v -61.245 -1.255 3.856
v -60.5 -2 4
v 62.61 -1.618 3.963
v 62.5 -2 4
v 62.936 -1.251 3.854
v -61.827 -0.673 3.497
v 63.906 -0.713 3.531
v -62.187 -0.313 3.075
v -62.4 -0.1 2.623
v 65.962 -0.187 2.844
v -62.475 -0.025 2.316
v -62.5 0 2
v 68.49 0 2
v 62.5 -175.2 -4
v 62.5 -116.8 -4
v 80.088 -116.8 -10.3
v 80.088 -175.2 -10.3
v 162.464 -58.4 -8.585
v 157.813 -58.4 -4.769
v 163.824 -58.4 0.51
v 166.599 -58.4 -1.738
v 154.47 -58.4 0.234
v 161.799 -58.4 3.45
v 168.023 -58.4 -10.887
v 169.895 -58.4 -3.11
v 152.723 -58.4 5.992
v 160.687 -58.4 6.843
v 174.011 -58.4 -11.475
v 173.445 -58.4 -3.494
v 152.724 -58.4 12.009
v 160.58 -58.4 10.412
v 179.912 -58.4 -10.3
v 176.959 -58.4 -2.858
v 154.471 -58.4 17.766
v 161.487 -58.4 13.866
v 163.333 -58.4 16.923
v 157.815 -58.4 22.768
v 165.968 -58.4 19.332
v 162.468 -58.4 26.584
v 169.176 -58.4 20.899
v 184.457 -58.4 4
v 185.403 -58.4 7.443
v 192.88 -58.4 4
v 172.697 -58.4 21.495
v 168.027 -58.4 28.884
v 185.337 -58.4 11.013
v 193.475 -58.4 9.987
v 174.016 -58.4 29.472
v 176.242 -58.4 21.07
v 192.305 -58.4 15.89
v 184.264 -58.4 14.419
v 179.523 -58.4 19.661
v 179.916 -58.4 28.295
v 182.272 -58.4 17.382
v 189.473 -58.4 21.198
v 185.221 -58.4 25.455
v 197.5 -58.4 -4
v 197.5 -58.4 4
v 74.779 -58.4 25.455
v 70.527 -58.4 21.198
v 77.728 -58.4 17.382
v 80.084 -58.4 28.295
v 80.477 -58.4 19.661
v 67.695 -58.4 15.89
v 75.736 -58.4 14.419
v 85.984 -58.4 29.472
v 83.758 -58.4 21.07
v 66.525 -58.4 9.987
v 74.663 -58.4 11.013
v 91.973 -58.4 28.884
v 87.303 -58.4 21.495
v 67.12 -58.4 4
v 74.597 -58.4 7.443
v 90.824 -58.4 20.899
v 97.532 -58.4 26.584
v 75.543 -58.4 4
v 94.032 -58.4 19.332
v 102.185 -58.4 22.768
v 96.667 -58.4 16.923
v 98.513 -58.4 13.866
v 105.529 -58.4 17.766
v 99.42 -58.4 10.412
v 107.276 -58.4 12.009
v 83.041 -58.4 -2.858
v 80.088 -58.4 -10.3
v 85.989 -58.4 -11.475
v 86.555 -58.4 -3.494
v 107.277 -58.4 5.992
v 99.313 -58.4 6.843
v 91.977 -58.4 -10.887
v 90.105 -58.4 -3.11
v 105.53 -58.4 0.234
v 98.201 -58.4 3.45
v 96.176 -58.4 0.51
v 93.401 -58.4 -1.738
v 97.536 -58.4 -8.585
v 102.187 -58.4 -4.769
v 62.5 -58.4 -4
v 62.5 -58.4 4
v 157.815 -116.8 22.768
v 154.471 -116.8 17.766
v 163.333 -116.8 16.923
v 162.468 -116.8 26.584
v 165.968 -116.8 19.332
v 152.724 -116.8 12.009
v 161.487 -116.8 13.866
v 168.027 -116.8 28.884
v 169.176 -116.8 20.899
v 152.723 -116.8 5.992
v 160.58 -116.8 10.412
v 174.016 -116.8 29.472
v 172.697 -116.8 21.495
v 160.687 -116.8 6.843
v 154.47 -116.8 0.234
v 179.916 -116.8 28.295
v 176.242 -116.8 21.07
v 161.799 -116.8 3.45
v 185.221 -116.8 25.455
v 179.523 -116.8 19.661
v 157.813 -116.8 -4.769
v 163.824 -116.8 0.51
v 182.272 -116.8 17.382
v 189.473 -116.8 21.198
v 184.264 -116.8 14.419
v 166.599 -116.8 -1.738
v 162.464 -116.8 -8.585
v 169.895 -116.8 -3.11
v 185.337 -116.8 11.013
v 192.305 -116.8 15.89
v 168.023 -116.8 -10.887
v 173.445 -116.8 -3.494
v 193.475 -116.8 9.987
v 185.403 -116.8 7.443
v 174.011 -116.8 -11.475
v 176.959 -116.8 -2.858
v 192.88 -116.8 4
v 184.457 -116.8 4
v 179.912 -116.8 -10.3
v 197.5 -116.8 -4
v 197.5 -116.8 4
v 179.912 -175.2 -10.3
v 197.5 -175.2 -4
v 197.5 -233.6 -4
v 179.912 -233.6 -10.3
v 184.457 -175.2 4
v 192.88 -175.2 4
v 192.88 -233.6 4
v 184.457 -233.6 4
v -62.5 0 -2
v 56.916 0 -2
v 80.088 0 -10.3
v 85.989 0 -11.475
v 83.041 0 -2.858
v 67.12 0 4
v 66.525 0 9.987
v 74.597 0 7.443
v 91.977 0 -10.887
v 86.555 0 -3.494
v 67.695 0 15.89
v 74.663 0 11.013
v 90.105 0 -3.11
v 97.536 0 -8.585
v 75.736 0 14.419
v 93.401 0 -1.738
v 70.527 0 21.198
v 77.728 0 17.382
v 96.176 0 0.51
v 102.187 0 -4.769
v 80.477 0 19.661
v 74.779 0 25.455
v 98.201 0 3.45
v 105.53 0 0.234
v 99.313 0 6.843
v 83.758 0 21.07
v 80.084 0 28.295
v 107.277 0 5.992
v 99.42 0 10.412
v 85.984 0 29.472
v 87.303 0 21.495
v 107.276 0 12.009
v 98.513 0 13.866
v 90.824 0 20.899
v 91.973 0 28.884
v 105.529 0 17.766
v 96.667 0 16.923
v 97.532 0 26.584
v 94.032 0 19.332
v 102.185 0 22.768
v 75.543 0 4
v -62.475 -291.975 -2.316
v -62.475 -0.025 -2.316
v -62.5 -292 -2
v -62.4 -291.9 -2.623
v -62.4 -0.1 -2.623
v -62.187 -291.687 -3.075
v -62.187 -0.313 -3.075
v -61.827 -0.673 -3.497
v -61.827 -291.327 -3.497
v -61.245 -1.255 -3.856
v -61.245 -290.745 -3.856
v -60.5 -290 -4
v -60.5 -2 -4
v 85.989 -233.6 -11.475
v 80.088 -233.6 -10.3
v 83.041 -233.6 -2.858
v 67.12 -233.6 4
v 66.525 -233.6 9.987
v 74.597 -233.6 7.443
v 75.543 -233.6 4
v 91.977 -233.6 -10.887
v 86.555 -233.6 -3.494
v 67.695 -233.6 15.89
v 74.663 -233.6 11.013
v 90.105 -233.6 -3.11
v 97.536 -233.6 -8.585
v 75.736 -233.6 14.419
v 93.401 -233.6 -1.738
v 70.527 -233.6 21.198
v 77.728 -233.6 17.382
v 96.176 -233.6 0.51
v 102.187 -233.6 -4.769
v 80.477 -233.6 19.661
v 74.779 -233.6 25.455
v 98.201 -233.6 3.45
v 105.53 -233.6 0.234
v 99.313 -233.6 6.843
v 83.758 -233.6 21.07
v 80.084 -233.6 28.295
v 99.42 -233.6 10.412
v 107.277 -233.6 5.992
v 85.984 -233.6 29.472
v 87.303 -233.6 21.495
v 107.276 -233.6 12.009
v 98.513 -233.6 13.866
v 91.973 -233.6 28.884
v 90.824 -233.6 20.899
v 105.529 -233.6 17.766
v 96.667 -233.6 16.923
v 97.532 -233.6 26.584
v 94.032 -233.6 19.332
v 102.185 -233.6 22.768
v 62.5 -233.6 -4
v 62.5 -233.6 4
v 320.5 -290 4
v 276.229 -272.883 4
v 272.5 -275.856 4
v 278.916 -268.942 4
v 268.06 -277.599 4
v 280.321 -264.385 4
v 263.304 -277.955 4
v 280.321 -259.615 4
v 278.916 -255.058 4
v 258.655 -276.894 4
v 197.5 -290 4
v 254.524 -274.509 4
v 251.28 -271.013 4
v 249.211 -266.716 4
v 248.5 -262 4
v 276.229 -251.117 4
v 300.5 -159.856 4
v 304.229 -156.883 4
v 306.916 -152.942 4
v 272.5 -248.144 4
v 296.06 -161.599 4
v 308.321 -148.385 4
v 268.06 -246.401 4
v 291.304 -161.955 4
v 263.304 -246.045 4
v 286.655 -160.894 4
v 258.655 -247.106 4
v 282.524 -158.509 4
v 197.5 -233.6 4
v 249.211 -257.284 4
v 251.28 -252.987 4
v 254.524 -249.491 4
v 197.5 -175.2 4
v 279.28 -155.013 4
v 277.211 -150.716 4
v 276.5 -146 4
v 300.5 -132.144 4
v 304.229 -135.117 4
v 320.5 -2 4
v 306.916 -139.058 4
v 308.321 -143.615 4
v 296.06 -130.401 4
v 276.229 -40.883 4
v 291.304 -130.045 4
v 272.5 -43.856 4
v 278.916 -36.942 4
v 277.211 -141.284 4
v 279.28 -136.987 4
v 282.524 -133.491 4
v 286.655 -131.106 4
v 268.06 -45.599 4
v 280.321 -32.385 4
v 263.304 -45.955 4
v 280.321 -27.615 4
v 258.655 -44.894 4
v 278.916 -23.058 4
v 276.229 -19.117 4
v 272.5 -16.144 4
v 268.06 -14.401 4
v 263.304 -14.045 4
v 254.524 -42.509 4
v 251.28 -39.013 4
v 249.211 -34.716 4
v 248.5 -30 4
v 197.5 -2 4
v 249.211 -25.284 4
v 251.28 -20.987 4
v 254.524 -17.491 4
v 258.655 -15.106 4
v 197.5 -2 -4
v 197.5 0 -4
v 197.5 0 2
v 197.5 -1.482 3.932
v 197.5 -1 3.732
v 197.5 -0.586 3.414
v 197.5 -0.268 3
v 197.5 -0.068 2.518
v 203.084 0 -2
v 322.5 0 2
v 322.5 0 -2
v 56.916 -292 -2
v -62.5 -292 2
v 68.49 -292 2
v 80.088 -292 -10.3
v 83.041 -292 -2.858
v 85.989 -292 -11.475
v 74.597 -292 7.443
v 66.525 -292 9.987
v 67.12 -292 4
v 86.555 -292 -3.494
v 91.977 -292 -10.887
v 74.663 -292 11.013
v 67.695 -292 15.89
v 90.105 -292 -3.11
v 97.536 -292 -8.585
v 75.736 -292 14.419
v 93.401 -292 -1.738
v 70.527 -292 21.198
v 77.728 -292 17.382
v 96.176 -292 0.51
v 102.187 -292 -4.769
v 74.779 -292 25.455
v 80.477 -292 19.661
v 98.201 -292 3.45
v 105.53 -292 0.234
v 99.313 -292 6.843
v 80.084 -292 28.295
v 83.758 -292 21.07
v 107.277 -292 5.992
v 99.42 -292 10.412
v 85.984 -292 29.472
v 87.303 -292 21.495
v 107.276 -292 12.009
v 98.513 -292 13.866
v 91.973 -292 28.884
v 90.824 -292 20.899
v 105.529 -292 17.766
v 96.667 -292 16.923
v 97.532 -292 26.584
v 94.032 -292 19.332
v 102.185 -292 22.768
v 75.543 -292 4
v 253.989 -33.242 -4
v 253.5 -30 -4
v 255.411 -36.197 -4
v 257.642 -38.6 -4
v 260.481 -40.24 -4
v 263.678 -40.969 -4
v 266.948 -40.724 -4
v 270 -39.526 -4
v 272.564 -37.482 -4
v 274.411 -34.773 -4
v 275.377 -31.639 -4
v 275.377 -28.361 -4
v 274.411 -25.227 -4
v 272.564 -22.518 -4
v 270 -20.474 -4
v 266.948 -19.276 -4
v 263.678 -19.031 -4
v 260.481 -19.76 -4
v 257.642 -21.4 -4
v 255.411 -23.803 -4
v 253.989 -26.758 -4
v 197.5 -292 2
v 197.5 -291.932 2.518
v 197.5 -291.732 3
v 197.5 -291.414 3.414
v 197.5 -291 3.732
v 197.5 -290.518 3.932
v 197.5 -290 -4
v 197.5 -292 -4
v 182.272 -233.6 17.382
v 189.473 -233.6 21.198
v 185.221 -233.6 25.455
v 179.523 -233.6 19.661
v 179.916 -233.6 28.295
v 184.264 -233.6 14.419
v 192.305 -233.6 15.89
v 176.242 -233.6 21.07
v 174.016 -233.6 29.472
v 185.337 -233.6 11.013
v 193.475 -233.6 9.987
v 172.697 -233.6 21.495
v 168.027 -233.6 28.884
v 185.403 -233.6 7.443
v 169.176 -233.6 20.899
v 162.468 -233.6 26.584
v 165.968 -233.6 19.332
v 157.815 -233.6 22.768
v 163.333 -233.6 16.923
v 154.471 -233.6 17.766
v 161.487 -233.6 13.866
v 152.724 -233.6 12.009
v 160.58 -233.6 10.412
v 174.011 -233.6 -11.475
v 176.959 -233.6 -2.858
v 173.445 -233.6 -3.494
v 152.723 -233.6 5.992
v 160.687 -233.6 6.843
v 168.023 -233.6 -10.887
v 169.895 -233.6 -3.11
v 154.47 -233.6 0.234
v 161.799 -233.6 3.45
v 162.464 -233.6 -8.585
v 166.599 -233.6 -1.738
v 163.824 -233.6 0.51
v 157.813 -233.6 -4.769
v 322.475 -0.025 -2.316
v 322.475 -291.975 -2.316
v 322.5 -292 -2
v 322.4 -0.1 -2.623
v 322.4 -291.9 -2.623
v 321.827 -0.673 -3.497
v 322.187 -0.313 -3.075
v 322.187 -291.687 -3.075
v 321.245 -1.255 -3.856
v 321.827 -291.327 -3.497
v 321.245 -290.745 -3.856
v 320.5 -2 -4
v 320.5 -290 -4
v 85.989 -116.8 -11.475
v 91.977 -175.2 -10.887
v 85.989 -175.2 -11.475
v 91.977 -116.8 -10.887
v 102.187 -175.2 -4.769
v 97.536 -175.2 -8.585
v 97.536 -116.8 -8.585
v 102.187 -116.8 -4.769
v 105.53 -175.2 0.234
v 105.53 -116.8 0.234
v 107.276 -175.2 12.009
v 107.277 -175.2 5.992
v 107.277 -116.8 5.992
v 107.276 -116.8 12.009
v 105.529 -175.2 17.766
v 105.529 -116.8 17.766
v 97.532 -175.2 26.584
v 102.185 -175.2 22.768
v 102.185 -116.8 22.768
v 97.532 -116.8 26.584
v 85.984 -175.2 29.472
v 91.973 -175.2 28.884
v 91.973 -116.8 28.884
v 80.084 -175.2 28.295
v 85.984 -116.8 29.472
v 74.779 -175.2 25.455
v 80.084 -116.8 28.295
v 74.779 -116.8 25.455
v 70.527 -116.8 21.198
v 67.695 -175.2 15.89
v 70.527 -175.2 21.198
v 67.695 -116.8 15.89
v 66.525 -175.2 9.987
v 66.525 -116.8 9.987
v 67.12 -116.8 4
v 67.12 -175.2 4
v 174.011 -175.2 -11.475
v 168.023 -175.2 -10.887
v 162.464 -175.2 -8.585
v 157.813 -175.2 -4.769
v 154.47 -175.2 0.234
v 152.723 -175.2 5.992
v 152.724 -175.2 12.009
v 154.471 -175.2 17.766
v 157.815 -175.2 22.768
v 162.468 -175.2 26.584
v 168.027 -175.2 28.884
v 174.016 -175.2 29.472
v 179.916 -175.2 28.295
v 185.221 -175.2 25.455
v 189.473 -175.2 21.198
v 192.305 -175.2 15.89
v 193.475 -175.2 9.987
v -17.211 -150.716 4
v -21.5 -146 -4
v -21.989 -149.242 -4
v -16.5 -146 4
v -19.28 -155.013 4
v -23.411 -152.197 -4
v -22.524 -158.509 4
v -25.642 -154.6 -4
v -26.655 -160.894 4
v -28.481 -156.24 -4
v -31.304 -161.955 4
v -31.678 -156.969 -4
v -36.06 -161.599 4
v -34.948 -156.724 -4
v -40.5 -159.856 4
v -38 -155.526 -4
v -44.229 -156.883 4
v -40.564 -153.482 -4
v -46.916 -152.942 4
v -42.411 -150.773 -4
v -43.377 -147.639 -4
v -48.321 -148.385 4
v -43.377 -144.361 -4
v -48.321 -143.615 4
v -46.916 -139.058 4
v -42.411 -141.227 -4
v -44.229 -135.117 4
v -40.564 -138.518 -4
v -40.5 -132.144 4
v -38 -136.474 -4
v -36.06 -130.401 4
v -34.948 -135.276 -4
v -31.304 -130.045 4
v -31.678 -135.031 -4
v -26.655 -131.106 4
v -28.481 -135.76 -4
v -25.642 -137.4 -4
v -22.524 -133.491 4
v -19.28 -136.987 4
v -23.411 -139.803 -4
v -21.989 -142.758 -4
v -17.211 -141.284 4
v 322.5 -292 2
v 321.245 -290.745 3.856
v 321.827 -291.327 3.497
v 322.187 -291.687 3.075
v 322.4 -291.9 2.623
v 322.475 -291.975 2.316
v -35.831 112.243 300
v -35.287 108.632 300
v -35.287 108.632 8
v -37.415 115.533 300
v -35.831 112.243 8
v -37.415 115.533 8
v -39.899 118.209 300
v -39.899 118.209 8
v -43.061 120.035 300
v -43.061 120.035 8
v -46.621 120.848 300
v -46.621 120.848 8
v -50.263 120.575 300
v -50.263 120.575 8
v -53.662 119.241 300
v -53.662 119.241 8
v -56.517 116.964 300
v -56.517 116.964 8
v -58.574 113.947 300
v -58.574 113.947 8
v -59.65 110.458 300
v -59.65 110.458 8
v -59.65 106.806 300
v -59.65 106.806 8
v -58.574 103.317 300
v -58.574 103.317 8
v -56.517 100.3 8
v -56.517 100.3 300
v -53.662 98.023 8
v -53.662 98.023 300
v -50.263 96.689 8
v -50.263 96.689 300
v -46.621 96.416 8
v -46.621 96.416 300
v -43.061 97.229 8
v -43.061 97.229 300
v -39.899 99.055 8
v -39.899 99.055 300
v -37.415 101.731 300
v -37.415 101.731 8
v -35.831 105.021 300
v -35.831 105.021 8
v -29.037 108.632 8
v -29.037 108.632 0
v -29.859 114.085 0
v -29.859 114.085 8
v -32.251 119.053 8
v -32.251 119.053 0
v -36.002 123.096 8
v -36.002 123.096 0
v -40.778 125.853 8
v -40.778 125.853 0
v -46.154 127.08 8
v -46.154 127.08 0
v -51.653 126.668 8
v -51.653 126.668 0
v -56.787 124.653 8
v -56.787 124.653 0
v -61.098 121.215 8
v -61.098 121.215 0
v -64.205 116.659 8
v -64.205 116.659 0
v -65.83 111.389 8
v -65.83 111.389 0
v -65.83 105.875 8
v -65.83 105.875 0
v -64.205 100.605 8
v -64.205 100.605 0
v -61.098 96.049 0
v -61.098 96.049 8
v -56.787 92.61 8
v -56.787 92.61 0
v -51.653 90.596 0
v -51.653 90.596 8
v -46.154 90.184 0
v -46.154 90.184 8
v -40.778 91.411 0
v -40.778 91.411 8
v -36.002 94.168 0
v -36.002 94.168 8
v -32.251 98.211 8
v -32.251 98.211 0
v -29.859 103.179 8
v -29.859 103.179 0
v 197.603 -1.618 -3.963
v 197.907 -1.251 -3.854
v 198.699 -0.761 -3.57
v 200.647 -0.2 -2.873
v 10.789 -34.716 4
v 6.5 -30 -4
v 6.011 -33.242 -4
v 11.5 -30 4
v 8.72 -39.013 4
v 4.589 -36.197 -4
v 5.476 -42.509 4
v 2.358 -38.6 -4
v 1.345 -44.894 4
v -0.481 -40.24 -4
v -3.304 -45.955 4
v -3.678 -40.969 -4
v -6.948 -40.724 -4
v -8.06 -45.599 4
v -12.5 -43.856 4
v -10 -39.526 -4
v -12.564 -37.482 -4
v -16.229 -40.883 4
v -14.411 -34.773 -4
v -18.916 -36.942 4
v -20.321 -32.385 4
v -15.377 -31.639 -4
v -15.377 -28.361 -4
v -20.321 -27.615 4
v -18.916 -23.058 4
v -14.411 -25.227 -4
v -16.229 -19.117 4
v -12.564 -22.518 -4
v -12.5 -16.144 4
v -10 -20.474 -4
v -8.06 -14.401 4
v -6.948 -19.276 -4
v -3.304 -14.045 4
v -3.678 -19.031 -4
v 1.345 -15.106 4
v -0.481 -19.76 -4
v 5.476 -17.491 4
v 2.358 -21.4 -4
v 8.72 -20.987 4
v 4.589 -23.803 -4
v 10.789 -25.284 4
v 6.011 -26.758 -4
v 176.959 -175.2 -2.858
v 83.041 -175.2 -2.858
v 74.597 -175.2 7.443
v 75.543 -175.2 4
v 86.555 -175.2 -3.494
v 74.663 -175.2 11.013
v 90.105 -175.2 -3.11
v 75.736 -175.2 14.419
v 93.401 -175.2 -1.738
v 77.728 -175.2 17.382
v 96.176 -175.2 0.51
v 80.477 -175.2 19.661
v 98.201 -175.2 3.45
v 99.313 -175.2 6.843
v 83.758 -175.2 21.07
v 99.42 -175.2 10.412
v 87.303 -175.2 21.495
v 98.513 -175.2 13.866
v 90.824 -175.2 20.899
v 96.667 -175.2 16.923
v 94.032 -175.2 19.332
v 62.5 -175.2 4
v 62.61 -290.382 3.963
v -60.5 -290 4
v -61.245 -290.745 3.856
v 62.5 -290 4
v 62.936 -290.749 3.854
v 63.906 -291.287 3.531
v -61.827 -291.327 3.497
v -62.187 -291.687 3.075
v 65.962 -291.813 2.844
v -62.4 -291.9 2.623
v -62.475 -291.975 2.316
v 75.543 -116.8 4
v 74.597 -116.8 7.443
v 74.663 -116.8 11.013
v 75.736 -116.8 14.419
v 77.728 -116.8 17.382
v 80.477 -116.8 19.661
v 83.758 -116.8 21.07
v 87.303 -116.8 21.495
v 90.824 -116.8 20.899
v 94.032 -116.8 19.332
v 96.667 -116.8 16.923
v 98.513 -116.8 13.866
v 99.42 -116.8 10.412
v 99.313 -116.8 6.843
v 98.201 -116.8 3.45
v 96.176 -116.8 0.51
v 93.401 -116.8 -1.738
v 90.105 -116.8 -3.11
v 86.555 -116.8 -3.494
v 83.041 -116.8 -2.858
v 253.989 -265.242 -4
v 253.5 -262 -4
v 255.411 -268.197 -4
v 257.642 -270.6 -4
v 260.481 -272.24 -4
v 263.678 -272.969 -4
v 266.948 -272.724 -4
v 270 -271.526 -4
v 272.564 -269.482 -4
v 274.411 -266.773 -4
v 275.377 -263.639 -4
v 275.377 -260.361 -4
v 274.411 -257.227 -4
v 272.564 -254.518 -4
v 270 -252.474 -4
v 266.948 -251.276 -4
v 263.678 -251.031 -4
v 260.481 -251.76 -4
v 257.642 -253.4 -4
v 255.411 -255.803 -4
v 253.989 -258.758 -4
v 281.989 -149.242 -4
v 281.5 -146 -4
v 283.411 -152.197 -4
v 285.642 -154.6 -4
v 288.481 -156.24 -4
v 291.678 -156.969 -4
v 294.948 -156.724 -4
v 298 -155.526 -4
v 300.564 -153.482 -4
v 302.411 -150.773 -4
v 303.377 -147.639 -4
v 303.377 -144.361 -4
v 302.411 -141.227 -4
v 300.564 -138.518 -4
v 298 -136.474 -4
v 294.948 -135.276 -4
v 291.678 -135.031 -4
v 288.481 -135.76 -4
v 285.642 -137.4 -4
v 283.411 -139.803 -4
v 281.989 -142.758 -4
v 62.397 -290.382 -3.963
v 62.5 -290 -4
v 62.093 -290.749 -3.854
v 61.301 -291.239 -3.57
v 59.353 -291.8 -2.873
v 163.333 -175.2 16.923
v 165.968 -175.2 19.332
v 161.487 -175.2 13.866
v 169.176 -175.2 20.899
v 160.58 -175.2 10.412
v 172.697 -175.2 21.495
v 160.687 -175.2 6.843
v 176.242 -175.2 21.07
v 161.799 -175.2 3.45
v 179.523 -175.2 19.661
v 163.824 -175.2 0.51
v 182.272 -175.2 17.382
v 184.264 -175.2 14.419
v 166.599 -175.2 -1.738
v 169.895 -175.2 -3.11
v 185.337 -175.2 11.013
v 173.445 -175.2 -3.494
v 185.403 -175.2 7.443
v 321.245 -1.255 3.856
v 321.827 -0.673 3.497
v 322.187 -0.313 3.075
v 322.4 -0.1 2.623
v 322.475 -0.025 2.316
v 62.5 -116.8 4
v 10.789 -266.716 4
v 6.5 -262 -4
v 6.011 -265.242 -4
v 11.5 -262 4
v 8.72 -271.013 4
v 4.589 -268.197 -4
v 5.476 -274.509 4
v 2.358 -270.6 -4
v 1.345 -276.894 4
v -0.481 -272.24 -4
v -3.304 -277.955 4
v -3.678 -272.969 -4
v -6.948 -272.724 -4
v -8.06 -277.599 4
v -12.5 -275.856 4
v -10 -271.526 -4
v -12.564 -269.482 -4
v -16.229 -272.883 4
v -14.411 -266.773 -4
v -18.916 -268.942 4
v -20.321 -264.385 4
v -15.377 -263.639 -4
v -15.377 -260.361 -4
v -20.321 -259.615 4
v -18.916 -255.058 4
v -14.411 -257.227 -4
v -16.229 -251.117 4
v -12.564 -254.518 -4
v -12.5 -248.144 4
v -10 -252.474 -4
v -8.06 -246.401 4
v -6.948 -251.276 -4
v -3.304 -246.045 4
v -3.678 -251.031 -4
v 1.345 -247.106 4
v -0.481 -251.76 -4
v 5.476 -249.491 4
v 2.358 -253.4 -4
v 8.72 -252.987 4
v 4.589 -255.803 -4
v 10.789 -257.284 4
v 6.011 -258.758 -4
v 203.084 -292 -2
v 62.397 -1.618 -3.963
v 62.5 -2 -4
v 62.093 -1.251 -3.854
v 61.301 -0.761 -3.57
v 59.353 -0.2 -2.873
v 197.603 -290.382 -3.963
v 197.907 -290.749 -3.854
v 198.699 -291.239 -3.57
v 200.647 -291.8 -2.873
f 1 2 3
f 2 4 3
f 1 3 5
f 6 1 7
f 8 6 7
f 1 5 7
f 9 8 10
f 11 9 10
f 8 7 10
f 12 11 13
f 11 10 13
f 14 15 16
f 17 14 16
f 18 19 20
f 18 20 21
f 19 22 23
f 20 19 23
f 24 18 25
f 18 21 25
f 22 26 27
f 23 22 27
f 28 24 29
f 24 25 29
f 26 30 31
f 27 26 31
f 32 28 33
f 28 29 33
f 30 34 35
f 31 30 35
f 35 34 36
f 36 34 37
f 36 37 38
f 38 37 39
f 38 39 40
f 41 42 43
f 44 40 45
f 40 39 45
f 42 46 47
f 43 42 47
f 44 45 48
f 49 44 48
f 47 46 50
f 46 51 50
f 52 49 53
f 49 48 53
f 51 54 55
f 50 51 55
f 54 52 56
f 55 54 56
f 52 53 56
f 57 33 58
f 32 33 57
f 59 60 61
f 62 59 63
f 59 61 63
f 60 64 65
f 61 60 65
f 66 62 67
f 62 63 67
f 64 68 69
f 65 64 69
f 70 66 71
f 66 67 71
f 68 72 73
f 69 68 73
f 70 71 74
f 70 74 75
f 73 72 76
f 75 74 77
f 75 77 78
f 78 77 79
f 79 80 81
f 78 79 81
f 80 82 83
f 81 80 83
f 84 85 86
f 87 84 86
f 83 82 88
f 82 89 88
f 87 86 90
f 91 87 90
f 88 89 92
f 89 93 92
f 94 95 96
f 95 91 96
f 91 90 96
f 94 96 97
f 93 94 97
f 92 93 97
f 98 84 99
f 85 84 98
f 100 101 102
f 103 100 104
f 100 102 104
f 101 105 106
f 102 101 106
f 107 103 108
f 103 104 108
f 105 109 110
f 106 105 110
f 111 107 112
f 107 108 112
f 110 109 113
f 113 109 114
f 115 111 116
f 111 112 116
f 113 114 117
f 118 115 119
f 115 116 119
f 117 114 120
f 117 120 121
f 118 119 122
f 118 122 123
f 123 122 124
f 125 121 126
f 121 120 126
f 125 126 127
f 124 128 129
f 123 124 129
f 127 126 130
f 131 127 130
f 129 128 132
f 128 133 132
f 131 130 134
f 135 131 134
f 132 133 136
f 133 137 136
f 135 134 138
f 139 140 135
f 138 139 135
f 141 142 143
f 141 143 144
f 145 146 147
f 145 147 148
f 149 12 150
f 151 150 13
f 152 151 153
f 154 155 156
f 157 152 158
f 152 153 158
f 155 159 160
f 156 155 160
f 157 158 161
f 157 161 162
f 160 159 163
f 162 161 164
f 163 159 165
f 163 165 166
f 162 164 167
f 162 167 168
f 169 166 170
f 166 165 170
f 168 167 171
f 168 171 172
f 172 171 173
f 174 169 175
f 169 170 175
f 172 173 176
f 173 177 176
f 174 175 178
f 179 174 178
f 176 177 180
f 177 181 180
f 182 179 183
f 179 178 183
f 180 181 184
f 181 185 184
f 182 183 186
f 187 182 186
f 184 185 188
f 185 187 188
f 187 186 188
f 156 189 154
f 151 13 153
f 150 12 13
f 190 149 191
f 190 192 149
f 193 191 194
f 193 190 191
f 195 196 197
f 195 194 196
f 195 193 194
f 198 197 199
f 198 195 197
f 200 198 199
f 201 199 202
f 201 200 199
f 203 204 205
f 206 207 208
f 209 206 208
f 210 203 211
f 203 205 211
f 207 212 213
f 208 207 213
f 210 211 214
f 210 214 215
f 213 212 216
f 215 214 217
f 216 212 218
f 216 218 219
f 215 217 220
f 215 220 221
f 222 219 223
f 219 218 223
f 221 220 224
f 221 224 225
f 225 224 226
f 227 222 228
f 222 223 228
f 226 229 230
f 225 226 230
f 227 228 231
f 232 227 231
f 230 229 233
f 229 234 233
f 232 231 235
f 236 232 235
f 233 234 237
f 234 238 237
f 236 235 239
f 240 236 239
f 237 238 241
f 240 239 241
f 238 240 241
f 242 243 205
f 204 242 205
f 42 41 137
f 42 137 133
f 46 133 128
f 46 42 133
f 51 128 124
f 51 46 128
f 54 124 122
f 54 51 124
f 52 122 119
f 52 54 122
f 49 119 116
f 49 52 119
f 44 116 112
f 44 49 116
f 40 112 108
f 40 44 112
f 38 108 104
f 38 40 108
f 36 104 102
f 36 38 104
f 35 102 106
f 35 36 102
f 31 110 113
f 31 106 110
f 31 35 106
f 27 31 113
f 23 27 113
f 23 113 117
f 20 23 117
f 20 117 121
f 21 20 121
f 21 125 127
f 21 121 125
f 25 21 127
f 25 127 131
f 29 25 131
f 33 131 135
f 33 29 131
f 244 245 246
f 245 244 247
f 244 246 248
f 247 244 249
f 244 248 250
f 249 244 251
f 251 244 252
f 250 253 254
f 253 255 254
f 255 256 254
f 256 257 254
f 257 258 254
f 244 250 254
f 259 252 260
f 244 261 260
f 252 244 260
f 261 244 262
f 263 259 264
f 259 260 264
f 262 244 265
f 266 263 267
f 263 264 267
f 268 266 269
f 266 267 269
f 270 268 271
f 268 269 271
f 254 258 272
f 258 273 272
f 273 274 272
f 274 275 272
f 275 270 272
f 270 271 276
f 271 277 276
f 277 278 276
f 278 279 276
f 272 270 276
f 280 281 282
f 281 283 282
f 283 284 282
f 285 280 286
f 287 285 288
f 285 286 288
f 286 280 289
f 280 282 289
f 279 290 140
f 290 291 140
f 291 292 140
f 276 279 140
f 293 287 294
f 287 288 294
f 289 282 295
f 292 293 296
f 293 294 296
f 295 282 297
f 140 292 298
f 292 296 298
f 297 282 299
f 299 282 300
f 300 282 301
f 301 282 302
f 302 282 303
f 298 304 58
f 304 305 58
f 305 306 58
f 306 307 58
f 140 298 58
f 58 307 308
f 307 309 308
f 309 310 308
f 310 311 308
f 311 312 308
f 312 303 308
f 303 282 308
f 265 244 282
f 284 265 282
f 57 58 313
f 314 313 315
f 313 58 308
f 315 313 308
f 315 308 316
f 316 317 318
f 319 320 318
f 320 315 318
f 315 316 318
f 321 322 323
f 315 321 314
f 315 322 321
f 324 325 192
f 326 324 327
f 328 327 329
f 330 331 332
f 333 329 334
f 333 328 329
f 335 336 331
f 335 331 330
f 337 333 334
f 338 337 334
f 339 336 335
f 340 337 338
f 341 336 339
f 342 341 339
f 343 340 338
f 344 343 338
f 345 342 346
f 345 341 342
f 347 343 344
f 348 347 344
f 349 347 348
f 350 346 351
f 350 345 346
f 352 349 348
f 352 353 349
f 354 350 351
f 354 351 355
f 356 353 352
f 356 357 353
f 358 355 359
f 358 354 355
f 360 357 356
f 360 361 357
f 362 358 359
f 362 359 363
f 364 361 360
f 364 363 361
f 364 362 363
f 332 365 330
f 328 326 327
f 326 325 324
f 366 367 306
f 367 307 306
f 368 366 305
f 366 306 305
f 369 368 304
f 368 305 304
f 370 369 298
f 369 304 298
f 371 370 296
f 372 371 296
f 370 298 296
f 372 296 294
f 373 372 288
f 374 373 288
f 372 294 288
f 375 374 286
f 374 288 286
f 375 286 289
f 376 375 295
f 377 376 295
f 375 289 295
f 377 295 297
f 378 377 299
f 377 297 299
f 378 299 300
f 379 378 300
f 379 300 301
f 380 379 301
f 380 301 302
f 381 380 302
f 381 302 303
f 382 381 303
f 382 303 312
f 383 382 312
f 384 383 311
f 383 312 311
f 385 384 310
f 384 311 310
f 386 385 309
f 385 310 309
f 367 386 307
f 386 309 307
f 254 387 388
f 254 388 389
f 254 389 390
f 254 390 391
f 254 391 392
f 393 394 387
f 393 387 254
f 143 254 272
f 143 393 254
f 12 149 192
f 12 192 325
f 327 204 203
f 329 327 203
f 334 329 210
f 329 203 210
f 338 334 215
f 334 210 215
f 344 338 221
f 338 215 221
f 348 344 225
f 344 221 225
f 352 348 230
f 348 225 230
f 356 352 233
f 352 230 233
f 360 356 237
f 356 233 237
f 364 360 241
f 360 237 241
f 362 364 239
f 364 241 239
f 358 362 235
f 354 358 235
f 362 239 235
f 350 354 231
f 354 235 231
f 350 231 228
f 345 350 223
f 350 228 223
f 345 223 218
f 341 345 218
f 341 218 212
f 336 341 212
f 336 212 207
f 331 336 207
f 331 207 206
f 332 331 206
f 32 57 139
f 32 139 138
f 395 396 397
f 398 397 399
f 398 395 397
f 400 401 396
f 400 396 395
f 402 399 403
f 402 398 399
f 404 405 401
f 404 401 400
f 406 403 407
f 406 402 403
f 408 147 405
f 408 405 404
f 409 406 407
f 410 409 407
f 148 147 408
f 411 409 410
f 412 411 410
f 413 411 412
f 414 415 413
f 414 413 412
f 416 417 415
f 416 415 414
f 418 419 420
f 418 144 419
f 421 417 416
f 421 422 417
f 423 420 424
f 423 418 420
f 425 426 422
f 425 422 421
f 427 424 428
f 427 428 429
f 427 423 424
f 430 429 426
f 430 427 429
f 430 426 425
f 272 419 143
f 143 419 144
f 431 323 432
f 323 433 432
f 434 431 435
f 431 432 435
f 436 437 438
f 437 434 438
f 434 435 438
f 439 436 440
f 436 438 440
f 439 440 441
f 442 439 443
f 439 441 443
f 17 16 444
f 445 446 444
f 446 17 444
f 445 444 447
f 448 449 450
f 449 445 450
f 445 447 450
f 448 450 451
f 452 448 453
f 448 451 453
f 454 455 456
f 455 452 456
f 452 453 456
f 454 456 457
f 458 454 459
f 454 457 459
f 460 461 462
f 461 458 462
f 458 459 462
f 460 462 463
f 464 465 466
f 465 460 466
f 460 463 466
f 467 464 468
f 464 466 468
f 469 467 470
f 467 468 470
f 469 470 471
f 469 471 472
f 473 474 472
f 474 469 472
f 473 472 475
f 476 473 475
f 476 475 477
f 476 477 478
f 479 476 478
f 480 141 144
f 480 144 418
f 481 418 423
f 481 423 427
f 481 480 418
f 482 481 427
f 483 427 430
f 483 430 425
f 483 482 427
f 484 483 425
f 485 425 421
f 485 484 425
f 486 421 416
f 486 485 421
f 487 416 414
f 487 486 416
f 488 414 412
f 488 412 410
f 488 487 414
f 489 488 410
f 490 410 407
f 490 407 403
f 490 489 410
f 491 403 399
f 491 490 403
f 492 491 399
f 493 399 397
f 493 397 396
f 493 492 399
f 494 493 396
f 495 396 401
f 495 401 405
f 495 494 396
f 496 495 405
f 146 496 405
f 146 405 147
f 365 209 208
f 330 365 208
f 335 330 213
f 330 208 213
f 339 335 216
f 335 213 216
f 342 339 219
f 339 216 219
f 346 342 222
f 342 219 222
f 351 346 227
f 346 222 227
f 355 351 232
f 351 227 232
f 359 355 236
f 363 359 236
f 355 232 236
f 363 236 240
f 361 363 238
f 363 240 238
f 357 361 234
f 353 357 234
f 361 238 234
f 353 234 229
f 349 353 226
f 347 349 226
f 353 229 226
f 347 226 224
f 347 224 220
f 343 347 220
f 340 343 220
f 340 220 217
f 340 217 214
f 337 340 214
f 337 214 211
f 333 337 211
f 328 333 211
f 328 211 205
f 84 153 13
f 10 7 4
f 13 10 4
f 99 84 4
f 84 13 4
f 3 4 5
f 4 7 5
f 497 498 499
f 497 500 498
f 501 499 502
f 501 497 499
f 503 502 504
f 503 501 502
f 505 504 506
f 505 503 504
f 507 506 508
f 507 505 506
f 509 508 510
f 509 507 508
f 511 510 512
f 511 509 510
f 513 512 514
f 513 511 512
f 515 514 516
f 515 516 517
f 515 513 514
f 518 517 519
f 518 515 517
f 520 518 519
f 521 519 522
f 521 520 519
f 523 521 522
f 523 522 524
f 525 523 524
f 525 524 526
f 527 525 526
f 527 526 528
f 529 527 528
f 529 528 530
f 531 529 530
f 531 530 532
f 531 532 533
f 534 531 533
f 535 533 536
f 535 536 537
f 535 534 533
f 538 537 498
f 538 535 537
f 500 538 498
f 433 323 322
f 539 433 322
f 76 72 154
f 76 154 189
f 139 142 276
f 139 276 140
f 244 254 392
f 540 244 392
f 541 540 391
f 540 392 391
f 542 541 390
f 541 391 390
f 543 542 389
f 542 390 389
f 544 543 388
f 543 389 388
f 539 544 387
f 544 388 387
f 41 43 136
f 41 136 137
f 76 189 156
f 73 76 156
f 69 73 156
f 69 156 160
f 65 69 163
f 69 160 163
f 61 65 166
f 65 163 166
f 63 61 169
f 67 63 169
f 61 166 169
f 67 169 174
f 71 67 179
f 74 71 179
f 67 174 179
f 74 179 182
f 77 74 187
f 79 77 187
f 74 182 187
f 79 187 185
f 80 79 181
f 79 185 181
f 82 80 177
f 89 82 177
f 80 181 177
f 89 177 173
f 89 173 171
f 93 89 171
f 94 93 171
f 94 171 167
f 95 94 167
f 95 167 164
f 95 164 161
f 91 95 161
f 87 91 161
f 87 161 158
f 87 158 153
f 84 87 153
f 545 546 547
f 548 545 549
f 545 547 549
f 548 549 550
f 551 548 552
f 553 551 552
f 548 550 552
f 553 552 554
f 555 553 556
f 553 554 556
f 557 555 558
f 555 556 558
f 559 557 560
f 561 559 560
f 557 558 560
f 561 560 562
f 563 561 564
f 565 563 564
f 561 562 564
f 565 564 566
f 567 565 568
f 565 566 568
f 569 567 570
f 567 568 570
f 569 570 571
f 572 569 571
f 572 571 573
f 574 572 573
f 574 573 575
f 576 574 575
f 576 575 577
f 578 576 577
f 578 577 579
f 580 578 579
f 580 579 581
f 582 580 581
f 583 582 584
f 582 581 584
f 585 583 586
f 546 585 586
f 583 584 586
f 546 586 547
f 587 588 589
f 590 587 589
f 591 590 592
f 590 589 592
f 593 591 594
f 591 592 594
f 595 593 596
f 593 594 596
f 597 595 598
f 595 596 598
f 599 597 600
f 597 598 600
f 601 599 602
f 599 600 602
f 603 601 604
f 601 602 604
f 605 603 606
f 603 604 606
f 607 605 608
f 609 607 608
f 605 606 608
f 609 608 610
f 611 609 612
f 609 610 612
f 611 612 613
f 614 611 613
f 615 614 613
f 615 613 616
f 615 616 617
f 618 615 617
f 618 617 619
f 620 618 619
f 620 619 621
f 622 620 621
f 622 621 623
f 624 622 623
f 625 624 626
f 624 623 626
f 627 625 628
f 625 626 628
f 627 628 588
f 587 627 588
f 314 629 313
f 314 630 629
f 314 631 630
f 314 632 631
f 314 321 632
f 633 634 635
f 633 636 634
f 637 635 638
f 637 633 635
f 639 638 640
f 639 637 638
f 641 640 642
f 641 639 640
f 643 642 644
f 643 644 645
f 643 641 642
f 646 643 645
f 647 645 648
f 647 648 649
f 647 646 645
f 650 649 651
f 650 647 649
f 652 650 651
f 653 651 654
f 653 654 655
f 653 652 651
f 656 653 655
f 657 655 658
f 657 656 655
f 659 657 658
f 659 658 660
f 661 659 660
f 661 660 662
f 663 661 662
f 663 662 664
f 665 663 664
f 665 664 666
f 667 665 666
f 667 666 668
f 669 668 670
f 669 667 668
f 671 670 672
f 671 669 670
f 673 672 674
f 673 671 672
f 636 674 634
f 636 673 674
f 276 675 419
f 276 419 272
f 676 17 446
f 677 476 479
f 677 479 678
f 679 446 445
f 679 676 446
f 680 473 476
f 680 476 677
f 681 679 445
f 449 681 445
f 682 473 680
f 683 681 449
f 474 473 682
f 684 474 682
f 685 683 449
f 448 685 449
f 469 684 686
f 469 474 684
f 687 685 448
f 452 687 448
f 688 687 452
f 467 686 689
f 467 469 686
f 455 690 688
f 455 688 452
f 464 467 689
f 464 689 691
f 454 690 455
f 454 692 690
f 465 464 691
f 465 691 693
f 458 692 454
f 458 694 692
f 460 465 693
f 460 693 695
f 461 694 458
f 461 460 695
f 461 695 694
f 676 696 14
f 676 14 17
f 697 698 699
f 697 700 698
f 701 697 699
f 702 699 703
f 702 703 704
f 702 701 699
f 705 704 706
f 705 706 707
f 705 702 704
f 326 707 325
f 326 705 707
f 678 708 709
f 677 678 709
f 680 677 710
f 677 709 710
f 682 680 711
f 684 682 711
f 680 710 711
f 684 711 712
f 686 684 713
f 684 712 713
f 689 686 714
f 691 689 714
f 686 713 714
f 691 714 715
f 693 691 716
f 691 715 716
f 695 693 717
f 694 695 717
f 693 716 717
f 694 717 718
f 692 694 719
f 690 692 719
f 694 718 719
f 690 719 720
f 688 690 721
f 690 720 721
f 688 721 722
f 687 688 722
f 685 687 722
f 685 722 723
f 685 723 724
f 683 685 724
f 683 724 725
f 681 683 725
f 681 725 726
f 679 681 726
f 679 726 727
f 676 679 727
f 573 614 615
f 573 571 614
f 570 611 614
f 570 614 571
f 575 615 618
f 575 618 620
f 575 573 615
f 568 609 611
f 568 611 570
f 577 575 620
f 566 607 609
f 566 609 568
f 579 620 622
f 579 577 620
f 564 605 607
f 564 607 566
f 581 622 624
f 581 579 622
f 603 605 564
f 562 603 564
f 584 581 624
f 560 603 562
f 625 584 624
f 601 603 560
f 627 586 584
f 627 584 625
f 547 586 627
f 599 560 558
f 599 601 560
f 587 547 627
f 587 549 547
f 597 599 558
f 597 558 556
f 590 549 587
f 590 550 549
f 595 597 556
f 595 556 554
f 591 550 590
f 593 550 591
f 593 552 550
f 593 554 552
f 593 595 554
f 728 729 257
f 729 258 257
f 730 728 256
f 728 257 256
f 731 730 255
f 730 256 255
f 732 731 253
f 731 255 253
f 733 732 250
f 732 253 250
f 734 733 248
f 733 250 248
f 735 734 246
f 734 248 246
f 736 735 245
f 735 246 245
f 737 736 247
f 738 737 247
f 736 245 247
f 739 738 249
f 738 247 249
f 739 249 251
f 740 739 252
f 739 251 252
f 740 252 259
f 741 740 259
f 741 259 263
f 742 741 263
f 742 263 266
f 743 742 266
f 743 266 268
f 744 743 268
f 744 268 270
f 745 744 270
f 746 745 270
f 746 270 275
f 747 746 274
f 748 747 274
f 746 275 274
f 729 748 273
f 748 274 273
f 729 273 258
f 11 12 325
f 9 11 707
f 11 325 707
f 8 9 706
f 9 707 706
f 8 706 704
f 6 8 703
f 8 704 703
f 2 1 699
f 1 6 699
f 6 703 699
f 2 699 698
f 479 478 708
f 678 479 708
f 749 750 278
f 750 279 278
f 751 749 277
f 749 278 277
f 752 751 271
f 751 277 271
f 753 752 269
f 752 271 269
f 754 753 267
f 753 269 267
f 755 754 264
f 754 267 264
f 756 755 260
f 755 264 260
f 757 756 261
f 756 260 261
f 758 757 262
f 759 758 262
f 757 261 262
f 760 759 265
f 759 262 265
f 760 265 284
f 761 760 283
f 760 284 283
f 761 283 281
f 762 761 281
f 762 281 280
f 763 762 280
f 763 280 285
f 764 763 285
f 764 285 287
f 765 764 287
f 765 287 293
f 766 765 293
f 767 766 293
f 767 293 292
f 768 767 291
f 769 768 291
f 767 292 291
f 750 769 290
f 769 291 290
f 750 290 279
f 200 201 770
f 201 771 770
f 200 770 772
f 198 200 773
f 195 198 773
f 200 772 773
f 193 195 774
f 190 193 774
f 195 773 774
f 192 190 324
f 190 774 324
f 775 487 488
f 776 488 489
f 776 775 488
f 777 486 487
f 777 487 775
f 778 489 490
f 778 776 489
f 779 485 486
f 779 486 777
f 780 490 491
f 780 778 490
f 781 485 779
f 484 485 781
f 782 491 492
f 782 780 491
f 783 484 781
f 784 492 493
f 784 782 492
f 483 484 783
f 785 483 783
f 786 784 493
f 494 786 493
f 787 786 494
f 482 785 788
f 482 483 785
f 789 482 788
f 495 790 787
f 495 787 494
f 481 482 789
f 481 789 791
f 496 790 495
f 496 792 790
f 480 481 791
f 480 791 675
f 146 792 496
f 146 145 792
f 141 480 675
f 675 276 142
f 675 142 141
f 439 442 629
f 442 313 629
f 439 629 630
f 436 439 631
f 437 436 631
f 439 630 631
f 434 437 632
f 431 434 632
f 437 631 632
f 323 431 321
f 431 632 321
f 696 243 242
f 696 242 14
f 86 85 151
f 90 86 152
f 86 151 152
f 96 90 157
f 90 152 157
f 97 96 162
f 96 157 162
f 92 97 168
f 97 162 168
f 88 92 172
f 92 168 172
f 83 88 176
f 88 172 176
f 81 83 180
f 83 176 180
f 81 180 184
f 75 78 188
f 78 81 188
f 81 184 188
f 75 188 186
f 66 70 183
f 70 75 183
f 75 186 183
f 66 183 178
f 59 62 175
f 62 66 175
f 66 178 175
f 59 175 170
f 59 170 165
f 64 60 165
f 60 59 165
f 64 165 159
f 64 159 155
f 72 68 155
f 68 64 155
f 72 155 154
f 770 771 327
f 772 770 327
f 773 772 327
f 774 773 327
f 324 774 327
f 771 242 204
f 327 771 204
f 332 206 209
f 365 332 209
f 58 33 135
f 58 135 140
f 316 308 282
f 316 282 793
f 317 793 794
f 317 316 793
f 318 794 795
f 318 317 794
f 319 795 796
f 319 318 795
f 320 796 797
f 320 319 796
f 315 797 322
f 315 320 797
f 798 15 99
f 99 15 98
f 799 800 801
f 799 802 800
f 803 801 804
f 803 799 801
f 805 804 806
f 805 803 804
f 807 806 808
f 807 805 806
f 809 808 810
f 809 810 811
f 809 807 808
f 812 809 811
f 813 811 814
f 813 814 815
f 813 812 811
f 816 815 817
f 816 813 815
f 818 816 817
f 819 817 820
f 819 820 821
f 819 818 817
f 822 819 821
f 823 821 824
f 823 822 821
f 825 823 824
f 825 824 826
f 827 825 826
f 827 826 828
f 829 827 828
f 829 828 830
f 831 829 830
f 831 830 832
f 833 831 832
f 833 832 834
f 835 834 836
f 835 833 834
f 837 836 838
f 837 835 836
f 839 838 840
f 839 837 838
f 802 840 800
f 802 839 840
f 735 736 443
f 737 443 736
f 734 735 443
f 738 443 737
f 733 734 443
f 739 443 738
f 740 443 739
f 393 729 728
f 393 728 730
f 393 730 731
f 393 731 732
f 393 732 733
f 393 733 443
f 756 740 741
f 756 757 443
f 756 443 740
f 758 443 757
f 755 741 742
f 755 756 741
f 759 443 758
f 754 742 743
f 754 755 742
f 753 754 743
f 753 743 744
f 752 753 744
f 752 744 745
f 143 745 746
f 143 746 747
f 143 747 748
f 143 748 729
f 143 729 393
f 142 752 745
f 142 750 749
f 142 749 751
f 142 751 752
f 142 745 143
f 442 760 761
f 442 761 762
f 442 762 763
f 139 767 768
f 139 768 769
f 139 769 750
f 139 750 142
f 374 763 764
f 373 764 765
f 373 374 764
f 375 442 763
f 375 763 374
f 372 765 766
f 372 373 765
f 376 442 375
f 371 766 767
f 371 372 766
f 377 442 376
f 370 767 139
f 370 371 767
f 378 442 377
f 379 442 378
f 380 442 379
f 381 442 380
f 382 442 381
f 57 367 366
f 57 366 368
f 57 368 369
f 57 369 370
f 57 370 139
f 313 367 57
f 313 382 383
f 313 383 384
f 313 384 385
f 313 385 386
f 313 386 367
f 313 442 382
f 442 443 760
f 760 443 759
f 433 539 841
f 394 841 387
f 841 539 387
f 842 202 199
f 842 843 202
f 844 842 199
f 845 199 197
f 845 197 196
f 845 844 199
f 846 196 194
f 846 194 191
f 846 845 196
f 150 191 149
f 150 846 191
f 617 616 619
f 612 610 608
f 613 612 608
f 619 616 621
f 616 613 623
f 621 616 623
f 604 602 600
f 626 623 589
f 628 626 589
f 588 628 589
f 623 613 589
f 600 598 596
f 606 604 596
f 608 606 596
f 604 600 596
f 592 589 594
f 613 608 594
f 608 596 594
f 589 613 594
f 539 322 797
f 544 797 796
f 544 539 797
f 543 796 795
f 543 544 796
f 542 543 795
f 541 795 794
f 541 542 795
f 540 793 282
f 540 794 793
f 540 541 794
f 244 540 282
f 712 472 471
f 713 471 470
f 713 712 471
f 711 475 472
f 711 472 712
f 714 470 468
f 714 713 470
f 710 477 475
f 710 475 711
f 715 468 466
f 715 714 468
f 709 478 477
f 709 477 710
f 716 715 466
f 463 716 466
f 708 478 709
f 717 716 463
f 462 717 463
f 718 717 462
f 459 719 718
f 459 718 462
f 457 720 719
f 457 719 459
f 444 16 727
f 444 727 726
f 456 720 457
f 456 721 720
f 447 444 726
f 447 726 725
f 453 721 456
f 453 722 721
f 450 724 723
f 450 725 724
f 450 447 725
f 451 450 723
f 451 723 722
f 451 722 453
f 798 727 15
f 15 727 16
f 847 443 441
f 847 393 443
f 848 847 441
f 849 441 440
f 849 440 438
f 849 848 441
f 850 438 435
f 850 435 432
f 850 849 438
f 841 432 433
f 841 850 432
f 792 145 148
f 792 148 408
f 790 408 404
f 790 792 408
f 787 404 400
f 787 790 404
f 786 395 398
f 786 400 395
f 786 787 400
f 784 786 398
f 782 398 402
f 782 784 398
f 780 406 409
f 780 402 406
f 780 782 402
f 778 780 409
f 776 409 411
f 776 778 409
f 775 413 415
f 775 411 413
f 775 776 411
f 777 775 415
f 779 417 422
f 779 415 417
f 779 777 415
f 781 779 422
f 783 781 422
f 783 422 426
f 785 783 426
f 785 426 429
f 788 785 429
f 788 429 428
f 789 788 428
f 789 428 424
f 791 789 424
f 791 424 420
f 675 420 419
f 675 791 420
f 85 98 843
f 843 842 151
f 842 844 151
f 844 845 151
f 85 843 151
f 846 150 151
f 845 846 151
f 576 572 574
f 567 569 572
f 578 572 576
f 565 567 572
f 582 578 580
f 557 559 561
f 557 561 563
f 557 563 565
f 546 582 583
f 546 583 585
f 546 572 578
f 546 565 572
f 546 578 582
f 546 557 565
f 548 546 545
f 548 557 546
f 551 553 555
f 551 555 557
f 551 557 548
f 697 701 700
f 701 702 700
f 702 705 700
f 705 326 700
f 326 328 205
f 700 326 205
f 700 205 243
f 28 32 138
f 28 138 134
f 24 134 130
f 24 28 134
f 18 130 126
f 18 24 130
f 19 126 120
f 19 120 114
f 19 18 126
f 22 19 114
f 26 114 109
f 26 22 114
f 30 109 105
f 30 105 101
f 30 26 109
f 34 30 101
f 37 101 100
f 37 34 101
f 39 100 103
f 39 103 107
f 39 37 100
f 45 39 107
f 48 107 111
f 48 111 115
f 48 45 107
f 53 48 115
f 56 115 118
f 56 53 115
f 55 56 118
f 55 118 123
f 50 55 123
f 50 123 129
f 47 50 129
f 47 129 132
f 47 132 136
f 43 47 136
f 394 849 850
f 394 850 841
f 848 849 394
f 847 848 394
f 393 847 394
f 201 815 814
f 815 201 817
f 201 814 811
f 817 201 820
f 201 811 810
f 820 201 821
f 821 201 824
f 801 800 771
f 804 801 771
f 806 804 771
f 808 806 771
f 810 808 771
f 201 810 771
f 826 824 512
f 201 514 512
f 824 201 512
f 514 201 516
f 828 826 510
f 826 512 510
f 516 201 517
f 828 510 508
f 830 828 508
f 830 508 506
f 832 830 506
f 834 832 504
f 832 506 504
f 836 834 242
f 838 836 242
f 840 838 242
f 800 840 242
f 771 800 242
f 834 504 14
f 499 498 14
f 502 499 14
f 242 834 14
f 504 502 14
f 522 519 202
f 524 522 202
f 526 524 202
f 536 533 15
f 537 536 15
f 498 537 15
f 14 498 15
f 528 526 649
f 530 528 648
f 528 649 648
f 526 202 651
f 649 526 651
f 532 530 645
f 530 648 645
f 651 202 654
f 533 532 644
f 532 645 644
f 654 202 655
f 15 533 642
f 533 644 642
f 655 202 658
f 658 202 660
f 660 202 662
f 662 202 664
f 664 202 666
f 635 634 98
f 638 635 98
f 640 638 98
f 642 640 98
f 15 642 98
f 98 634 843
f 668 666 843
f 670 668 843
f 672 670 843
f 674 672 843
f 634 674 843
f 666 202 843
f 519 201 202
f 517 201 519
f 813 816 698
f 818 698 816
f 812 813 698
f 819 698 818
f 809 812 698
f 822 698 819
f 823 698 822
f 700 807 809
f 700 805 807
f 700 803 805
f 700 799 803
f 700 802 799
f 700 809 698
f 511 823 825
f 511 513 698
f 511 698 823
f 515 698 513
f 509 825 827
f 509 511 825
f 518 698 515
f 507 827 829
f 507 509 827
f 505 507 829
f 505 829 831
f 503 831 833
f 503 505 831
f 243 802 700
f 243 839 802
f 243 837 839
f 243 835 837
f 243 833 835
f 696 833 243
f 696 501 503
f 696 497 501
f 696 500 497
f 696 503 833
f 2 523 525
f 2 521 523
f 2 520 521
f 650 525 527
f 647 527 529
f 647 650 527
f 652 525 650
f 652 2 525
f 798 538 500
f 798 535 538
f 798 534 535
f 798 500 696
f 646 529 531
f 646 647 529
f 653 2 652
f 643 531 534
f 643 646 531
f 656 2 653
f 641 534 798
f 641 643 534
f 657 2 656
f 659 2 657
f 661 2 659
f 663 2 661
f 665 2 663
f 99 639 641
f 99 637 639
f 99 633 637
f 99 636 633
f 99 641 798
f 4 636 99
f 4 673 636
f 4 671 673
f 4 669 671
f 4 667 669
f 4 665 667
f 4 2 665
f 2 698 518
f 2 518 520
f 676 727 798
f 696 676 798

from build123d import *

# Parameters (mm, degrees)
F0_W      = 125
F0_H      = 8
F1_DEPTH  = 292
F3_R      = 11
F2_R      = 16
F8_R      = 2
F2_W      = 80
F2_H      = 58.4
F10_DEPTH = 50
F11_W     = 65
F11_H     = 58.4
F12_DEPTH = 62.5
F13_R     = 18.5
F14_DEPTH = 8
F15_R     = 12.25
F16_DEPTH = 292


with BuildPart() as f1:
    # F0 (on Front) → F1 (new body)
    with BuildSketch(Plane.XZ):
        Rectangle(F0_W, F0_H)
        with BuildLine():
            Line((62.5, 4), (62.5, -4))
            Line((62.5, -4), (80.0878196661, -10.2996605775))
            ThreePointArc((80.0878196661, -10.2996605775), (102.1845976555, 22.7683073126), (67.120246264, 4))
            Line((67.120246264, 4), (75.5427898684, 4))
            ThreePointArc((75.5427898684, 4), (95.4363374083, 18.2220183642), (83.0413063969, -2.8583574935))
            Line((83.0413063969, -2.8583574935), (62.5, 4))
        make_face()
    extrude(amount=F1_DEPTH)

    # F3 (on face) → F4 section 0
    with BuildSketch(Plane(origin=(0, 0, -4), x_dir=(1, 0, 0), z_dir=(0, 0, -1))):
        with Locations((-32.5, 146)):
            Circle(F3_R)
    # F2 (on face) → F4 section 1
    with BuildSketch(Plane.XY.offset(4)):
        with Locations((-32.5, -146)):
            Circle(F2_R)
    loft(mode=Mode.SUBTRACT)

    # F3 (on face) → F5 section 0
    with BuildSketch(Plane(origin=(0, 0, -4), x_dir=(1, 0, 0), z_dir=(0, 0, -1))):
        with Locations((-4.5, 262)):
            Circle(F3_R)
    # F2 (on face) → F5 section 1
    with BuildSketch(Plane.XY.offset(4)):
        with Locations((-4.5, -262)):
            Circle(F2_R)
    loft(mode=Mode.SUBTRACT)

    # F3 (on face) → F6 section 0
    with BuildSketch(Plane(origin=(0, 0, -4), x_dir=(1, 0, 0), z_dir=(0, 0, -1))):
        with Locations((-4.5, 30)):
            Circle(F3_R)
    # F2 (on face) → F6 section 1
    with BuildSketch(Plane.XY.offset(4)):
        with Locations((-4.5, -30)):
            Circle(F2_R)
    loft(mode=Mode.SUBTRACT)

    # F8
    f8_edges = [f1.edges().sort_by_distance(p)[0] for p in [
        (0, -292, 4),
        (0, -292, -4),
        (0, 0, 4),
        (0, 0, -4),
        (-62.5, -146, 4),
        (-62.5, -146, -4),
    ]]
    fillet(f8_edges, radius=F8_R)


with BuildPart() as f9_1:
    # F9: instance of F1
    add(f1.part.mirror(Plane.YZ.offset(130)))

    # F11 (on face) → F12 (cut, symmetric)
    with BuildSketch(Plane.XY.offset(4)):
        Polygon((197.5, -292), (197.5, -290), (197.5, -233.6), (132.5, -233.6), (132.5, -292), align=None)
        with Locations((165, -146)):
            Rectangle(F11_W, F11_H)
        Polygon((197.5, -2), (197.5, 0), (132.5, 0), (132.5, -58.4), (197.5, -58.4), align=None)
    extrude(amount=F12_DEPTH, both=True, mode=Mode.SUBTRACT)


with BuildPart() as f1_1:
    add(f1.part)

    # F2 (on face) → F10 (cut, symmetric)
    with BuildSketch(Plane.XY.offset(4)):
        with Locations((102.5, -87.6)):
            Rectangle(F2_W, F2_H)
        with Locations((102.5, -204.4)):
            Rectangle(F2_W, F2_H)
    extrude(amount=F10_DEPTH, both=True, mode=Mode.SUBTRACT)


with BuildPart() as f14:
    # F13 (on Top) → F14 (new body)
    with BuildSketch(Plane.XY):
        with Locations((-47.5367307663, 108.6319535971)):
            Circle(F13_R)
    extrude(amount=F14_DEPTH)

    # F15 (on face) → F16 (join)
    with BuildSketch(Plane.XY.offset(8)):
        with Locations((-47.5367307663, 108.6319535971)):
            Circle(F15_R)
    extrude(amount=F16_DEPTH)


solid = Compound([f9_1.part, f1_1.part, f14.part])
